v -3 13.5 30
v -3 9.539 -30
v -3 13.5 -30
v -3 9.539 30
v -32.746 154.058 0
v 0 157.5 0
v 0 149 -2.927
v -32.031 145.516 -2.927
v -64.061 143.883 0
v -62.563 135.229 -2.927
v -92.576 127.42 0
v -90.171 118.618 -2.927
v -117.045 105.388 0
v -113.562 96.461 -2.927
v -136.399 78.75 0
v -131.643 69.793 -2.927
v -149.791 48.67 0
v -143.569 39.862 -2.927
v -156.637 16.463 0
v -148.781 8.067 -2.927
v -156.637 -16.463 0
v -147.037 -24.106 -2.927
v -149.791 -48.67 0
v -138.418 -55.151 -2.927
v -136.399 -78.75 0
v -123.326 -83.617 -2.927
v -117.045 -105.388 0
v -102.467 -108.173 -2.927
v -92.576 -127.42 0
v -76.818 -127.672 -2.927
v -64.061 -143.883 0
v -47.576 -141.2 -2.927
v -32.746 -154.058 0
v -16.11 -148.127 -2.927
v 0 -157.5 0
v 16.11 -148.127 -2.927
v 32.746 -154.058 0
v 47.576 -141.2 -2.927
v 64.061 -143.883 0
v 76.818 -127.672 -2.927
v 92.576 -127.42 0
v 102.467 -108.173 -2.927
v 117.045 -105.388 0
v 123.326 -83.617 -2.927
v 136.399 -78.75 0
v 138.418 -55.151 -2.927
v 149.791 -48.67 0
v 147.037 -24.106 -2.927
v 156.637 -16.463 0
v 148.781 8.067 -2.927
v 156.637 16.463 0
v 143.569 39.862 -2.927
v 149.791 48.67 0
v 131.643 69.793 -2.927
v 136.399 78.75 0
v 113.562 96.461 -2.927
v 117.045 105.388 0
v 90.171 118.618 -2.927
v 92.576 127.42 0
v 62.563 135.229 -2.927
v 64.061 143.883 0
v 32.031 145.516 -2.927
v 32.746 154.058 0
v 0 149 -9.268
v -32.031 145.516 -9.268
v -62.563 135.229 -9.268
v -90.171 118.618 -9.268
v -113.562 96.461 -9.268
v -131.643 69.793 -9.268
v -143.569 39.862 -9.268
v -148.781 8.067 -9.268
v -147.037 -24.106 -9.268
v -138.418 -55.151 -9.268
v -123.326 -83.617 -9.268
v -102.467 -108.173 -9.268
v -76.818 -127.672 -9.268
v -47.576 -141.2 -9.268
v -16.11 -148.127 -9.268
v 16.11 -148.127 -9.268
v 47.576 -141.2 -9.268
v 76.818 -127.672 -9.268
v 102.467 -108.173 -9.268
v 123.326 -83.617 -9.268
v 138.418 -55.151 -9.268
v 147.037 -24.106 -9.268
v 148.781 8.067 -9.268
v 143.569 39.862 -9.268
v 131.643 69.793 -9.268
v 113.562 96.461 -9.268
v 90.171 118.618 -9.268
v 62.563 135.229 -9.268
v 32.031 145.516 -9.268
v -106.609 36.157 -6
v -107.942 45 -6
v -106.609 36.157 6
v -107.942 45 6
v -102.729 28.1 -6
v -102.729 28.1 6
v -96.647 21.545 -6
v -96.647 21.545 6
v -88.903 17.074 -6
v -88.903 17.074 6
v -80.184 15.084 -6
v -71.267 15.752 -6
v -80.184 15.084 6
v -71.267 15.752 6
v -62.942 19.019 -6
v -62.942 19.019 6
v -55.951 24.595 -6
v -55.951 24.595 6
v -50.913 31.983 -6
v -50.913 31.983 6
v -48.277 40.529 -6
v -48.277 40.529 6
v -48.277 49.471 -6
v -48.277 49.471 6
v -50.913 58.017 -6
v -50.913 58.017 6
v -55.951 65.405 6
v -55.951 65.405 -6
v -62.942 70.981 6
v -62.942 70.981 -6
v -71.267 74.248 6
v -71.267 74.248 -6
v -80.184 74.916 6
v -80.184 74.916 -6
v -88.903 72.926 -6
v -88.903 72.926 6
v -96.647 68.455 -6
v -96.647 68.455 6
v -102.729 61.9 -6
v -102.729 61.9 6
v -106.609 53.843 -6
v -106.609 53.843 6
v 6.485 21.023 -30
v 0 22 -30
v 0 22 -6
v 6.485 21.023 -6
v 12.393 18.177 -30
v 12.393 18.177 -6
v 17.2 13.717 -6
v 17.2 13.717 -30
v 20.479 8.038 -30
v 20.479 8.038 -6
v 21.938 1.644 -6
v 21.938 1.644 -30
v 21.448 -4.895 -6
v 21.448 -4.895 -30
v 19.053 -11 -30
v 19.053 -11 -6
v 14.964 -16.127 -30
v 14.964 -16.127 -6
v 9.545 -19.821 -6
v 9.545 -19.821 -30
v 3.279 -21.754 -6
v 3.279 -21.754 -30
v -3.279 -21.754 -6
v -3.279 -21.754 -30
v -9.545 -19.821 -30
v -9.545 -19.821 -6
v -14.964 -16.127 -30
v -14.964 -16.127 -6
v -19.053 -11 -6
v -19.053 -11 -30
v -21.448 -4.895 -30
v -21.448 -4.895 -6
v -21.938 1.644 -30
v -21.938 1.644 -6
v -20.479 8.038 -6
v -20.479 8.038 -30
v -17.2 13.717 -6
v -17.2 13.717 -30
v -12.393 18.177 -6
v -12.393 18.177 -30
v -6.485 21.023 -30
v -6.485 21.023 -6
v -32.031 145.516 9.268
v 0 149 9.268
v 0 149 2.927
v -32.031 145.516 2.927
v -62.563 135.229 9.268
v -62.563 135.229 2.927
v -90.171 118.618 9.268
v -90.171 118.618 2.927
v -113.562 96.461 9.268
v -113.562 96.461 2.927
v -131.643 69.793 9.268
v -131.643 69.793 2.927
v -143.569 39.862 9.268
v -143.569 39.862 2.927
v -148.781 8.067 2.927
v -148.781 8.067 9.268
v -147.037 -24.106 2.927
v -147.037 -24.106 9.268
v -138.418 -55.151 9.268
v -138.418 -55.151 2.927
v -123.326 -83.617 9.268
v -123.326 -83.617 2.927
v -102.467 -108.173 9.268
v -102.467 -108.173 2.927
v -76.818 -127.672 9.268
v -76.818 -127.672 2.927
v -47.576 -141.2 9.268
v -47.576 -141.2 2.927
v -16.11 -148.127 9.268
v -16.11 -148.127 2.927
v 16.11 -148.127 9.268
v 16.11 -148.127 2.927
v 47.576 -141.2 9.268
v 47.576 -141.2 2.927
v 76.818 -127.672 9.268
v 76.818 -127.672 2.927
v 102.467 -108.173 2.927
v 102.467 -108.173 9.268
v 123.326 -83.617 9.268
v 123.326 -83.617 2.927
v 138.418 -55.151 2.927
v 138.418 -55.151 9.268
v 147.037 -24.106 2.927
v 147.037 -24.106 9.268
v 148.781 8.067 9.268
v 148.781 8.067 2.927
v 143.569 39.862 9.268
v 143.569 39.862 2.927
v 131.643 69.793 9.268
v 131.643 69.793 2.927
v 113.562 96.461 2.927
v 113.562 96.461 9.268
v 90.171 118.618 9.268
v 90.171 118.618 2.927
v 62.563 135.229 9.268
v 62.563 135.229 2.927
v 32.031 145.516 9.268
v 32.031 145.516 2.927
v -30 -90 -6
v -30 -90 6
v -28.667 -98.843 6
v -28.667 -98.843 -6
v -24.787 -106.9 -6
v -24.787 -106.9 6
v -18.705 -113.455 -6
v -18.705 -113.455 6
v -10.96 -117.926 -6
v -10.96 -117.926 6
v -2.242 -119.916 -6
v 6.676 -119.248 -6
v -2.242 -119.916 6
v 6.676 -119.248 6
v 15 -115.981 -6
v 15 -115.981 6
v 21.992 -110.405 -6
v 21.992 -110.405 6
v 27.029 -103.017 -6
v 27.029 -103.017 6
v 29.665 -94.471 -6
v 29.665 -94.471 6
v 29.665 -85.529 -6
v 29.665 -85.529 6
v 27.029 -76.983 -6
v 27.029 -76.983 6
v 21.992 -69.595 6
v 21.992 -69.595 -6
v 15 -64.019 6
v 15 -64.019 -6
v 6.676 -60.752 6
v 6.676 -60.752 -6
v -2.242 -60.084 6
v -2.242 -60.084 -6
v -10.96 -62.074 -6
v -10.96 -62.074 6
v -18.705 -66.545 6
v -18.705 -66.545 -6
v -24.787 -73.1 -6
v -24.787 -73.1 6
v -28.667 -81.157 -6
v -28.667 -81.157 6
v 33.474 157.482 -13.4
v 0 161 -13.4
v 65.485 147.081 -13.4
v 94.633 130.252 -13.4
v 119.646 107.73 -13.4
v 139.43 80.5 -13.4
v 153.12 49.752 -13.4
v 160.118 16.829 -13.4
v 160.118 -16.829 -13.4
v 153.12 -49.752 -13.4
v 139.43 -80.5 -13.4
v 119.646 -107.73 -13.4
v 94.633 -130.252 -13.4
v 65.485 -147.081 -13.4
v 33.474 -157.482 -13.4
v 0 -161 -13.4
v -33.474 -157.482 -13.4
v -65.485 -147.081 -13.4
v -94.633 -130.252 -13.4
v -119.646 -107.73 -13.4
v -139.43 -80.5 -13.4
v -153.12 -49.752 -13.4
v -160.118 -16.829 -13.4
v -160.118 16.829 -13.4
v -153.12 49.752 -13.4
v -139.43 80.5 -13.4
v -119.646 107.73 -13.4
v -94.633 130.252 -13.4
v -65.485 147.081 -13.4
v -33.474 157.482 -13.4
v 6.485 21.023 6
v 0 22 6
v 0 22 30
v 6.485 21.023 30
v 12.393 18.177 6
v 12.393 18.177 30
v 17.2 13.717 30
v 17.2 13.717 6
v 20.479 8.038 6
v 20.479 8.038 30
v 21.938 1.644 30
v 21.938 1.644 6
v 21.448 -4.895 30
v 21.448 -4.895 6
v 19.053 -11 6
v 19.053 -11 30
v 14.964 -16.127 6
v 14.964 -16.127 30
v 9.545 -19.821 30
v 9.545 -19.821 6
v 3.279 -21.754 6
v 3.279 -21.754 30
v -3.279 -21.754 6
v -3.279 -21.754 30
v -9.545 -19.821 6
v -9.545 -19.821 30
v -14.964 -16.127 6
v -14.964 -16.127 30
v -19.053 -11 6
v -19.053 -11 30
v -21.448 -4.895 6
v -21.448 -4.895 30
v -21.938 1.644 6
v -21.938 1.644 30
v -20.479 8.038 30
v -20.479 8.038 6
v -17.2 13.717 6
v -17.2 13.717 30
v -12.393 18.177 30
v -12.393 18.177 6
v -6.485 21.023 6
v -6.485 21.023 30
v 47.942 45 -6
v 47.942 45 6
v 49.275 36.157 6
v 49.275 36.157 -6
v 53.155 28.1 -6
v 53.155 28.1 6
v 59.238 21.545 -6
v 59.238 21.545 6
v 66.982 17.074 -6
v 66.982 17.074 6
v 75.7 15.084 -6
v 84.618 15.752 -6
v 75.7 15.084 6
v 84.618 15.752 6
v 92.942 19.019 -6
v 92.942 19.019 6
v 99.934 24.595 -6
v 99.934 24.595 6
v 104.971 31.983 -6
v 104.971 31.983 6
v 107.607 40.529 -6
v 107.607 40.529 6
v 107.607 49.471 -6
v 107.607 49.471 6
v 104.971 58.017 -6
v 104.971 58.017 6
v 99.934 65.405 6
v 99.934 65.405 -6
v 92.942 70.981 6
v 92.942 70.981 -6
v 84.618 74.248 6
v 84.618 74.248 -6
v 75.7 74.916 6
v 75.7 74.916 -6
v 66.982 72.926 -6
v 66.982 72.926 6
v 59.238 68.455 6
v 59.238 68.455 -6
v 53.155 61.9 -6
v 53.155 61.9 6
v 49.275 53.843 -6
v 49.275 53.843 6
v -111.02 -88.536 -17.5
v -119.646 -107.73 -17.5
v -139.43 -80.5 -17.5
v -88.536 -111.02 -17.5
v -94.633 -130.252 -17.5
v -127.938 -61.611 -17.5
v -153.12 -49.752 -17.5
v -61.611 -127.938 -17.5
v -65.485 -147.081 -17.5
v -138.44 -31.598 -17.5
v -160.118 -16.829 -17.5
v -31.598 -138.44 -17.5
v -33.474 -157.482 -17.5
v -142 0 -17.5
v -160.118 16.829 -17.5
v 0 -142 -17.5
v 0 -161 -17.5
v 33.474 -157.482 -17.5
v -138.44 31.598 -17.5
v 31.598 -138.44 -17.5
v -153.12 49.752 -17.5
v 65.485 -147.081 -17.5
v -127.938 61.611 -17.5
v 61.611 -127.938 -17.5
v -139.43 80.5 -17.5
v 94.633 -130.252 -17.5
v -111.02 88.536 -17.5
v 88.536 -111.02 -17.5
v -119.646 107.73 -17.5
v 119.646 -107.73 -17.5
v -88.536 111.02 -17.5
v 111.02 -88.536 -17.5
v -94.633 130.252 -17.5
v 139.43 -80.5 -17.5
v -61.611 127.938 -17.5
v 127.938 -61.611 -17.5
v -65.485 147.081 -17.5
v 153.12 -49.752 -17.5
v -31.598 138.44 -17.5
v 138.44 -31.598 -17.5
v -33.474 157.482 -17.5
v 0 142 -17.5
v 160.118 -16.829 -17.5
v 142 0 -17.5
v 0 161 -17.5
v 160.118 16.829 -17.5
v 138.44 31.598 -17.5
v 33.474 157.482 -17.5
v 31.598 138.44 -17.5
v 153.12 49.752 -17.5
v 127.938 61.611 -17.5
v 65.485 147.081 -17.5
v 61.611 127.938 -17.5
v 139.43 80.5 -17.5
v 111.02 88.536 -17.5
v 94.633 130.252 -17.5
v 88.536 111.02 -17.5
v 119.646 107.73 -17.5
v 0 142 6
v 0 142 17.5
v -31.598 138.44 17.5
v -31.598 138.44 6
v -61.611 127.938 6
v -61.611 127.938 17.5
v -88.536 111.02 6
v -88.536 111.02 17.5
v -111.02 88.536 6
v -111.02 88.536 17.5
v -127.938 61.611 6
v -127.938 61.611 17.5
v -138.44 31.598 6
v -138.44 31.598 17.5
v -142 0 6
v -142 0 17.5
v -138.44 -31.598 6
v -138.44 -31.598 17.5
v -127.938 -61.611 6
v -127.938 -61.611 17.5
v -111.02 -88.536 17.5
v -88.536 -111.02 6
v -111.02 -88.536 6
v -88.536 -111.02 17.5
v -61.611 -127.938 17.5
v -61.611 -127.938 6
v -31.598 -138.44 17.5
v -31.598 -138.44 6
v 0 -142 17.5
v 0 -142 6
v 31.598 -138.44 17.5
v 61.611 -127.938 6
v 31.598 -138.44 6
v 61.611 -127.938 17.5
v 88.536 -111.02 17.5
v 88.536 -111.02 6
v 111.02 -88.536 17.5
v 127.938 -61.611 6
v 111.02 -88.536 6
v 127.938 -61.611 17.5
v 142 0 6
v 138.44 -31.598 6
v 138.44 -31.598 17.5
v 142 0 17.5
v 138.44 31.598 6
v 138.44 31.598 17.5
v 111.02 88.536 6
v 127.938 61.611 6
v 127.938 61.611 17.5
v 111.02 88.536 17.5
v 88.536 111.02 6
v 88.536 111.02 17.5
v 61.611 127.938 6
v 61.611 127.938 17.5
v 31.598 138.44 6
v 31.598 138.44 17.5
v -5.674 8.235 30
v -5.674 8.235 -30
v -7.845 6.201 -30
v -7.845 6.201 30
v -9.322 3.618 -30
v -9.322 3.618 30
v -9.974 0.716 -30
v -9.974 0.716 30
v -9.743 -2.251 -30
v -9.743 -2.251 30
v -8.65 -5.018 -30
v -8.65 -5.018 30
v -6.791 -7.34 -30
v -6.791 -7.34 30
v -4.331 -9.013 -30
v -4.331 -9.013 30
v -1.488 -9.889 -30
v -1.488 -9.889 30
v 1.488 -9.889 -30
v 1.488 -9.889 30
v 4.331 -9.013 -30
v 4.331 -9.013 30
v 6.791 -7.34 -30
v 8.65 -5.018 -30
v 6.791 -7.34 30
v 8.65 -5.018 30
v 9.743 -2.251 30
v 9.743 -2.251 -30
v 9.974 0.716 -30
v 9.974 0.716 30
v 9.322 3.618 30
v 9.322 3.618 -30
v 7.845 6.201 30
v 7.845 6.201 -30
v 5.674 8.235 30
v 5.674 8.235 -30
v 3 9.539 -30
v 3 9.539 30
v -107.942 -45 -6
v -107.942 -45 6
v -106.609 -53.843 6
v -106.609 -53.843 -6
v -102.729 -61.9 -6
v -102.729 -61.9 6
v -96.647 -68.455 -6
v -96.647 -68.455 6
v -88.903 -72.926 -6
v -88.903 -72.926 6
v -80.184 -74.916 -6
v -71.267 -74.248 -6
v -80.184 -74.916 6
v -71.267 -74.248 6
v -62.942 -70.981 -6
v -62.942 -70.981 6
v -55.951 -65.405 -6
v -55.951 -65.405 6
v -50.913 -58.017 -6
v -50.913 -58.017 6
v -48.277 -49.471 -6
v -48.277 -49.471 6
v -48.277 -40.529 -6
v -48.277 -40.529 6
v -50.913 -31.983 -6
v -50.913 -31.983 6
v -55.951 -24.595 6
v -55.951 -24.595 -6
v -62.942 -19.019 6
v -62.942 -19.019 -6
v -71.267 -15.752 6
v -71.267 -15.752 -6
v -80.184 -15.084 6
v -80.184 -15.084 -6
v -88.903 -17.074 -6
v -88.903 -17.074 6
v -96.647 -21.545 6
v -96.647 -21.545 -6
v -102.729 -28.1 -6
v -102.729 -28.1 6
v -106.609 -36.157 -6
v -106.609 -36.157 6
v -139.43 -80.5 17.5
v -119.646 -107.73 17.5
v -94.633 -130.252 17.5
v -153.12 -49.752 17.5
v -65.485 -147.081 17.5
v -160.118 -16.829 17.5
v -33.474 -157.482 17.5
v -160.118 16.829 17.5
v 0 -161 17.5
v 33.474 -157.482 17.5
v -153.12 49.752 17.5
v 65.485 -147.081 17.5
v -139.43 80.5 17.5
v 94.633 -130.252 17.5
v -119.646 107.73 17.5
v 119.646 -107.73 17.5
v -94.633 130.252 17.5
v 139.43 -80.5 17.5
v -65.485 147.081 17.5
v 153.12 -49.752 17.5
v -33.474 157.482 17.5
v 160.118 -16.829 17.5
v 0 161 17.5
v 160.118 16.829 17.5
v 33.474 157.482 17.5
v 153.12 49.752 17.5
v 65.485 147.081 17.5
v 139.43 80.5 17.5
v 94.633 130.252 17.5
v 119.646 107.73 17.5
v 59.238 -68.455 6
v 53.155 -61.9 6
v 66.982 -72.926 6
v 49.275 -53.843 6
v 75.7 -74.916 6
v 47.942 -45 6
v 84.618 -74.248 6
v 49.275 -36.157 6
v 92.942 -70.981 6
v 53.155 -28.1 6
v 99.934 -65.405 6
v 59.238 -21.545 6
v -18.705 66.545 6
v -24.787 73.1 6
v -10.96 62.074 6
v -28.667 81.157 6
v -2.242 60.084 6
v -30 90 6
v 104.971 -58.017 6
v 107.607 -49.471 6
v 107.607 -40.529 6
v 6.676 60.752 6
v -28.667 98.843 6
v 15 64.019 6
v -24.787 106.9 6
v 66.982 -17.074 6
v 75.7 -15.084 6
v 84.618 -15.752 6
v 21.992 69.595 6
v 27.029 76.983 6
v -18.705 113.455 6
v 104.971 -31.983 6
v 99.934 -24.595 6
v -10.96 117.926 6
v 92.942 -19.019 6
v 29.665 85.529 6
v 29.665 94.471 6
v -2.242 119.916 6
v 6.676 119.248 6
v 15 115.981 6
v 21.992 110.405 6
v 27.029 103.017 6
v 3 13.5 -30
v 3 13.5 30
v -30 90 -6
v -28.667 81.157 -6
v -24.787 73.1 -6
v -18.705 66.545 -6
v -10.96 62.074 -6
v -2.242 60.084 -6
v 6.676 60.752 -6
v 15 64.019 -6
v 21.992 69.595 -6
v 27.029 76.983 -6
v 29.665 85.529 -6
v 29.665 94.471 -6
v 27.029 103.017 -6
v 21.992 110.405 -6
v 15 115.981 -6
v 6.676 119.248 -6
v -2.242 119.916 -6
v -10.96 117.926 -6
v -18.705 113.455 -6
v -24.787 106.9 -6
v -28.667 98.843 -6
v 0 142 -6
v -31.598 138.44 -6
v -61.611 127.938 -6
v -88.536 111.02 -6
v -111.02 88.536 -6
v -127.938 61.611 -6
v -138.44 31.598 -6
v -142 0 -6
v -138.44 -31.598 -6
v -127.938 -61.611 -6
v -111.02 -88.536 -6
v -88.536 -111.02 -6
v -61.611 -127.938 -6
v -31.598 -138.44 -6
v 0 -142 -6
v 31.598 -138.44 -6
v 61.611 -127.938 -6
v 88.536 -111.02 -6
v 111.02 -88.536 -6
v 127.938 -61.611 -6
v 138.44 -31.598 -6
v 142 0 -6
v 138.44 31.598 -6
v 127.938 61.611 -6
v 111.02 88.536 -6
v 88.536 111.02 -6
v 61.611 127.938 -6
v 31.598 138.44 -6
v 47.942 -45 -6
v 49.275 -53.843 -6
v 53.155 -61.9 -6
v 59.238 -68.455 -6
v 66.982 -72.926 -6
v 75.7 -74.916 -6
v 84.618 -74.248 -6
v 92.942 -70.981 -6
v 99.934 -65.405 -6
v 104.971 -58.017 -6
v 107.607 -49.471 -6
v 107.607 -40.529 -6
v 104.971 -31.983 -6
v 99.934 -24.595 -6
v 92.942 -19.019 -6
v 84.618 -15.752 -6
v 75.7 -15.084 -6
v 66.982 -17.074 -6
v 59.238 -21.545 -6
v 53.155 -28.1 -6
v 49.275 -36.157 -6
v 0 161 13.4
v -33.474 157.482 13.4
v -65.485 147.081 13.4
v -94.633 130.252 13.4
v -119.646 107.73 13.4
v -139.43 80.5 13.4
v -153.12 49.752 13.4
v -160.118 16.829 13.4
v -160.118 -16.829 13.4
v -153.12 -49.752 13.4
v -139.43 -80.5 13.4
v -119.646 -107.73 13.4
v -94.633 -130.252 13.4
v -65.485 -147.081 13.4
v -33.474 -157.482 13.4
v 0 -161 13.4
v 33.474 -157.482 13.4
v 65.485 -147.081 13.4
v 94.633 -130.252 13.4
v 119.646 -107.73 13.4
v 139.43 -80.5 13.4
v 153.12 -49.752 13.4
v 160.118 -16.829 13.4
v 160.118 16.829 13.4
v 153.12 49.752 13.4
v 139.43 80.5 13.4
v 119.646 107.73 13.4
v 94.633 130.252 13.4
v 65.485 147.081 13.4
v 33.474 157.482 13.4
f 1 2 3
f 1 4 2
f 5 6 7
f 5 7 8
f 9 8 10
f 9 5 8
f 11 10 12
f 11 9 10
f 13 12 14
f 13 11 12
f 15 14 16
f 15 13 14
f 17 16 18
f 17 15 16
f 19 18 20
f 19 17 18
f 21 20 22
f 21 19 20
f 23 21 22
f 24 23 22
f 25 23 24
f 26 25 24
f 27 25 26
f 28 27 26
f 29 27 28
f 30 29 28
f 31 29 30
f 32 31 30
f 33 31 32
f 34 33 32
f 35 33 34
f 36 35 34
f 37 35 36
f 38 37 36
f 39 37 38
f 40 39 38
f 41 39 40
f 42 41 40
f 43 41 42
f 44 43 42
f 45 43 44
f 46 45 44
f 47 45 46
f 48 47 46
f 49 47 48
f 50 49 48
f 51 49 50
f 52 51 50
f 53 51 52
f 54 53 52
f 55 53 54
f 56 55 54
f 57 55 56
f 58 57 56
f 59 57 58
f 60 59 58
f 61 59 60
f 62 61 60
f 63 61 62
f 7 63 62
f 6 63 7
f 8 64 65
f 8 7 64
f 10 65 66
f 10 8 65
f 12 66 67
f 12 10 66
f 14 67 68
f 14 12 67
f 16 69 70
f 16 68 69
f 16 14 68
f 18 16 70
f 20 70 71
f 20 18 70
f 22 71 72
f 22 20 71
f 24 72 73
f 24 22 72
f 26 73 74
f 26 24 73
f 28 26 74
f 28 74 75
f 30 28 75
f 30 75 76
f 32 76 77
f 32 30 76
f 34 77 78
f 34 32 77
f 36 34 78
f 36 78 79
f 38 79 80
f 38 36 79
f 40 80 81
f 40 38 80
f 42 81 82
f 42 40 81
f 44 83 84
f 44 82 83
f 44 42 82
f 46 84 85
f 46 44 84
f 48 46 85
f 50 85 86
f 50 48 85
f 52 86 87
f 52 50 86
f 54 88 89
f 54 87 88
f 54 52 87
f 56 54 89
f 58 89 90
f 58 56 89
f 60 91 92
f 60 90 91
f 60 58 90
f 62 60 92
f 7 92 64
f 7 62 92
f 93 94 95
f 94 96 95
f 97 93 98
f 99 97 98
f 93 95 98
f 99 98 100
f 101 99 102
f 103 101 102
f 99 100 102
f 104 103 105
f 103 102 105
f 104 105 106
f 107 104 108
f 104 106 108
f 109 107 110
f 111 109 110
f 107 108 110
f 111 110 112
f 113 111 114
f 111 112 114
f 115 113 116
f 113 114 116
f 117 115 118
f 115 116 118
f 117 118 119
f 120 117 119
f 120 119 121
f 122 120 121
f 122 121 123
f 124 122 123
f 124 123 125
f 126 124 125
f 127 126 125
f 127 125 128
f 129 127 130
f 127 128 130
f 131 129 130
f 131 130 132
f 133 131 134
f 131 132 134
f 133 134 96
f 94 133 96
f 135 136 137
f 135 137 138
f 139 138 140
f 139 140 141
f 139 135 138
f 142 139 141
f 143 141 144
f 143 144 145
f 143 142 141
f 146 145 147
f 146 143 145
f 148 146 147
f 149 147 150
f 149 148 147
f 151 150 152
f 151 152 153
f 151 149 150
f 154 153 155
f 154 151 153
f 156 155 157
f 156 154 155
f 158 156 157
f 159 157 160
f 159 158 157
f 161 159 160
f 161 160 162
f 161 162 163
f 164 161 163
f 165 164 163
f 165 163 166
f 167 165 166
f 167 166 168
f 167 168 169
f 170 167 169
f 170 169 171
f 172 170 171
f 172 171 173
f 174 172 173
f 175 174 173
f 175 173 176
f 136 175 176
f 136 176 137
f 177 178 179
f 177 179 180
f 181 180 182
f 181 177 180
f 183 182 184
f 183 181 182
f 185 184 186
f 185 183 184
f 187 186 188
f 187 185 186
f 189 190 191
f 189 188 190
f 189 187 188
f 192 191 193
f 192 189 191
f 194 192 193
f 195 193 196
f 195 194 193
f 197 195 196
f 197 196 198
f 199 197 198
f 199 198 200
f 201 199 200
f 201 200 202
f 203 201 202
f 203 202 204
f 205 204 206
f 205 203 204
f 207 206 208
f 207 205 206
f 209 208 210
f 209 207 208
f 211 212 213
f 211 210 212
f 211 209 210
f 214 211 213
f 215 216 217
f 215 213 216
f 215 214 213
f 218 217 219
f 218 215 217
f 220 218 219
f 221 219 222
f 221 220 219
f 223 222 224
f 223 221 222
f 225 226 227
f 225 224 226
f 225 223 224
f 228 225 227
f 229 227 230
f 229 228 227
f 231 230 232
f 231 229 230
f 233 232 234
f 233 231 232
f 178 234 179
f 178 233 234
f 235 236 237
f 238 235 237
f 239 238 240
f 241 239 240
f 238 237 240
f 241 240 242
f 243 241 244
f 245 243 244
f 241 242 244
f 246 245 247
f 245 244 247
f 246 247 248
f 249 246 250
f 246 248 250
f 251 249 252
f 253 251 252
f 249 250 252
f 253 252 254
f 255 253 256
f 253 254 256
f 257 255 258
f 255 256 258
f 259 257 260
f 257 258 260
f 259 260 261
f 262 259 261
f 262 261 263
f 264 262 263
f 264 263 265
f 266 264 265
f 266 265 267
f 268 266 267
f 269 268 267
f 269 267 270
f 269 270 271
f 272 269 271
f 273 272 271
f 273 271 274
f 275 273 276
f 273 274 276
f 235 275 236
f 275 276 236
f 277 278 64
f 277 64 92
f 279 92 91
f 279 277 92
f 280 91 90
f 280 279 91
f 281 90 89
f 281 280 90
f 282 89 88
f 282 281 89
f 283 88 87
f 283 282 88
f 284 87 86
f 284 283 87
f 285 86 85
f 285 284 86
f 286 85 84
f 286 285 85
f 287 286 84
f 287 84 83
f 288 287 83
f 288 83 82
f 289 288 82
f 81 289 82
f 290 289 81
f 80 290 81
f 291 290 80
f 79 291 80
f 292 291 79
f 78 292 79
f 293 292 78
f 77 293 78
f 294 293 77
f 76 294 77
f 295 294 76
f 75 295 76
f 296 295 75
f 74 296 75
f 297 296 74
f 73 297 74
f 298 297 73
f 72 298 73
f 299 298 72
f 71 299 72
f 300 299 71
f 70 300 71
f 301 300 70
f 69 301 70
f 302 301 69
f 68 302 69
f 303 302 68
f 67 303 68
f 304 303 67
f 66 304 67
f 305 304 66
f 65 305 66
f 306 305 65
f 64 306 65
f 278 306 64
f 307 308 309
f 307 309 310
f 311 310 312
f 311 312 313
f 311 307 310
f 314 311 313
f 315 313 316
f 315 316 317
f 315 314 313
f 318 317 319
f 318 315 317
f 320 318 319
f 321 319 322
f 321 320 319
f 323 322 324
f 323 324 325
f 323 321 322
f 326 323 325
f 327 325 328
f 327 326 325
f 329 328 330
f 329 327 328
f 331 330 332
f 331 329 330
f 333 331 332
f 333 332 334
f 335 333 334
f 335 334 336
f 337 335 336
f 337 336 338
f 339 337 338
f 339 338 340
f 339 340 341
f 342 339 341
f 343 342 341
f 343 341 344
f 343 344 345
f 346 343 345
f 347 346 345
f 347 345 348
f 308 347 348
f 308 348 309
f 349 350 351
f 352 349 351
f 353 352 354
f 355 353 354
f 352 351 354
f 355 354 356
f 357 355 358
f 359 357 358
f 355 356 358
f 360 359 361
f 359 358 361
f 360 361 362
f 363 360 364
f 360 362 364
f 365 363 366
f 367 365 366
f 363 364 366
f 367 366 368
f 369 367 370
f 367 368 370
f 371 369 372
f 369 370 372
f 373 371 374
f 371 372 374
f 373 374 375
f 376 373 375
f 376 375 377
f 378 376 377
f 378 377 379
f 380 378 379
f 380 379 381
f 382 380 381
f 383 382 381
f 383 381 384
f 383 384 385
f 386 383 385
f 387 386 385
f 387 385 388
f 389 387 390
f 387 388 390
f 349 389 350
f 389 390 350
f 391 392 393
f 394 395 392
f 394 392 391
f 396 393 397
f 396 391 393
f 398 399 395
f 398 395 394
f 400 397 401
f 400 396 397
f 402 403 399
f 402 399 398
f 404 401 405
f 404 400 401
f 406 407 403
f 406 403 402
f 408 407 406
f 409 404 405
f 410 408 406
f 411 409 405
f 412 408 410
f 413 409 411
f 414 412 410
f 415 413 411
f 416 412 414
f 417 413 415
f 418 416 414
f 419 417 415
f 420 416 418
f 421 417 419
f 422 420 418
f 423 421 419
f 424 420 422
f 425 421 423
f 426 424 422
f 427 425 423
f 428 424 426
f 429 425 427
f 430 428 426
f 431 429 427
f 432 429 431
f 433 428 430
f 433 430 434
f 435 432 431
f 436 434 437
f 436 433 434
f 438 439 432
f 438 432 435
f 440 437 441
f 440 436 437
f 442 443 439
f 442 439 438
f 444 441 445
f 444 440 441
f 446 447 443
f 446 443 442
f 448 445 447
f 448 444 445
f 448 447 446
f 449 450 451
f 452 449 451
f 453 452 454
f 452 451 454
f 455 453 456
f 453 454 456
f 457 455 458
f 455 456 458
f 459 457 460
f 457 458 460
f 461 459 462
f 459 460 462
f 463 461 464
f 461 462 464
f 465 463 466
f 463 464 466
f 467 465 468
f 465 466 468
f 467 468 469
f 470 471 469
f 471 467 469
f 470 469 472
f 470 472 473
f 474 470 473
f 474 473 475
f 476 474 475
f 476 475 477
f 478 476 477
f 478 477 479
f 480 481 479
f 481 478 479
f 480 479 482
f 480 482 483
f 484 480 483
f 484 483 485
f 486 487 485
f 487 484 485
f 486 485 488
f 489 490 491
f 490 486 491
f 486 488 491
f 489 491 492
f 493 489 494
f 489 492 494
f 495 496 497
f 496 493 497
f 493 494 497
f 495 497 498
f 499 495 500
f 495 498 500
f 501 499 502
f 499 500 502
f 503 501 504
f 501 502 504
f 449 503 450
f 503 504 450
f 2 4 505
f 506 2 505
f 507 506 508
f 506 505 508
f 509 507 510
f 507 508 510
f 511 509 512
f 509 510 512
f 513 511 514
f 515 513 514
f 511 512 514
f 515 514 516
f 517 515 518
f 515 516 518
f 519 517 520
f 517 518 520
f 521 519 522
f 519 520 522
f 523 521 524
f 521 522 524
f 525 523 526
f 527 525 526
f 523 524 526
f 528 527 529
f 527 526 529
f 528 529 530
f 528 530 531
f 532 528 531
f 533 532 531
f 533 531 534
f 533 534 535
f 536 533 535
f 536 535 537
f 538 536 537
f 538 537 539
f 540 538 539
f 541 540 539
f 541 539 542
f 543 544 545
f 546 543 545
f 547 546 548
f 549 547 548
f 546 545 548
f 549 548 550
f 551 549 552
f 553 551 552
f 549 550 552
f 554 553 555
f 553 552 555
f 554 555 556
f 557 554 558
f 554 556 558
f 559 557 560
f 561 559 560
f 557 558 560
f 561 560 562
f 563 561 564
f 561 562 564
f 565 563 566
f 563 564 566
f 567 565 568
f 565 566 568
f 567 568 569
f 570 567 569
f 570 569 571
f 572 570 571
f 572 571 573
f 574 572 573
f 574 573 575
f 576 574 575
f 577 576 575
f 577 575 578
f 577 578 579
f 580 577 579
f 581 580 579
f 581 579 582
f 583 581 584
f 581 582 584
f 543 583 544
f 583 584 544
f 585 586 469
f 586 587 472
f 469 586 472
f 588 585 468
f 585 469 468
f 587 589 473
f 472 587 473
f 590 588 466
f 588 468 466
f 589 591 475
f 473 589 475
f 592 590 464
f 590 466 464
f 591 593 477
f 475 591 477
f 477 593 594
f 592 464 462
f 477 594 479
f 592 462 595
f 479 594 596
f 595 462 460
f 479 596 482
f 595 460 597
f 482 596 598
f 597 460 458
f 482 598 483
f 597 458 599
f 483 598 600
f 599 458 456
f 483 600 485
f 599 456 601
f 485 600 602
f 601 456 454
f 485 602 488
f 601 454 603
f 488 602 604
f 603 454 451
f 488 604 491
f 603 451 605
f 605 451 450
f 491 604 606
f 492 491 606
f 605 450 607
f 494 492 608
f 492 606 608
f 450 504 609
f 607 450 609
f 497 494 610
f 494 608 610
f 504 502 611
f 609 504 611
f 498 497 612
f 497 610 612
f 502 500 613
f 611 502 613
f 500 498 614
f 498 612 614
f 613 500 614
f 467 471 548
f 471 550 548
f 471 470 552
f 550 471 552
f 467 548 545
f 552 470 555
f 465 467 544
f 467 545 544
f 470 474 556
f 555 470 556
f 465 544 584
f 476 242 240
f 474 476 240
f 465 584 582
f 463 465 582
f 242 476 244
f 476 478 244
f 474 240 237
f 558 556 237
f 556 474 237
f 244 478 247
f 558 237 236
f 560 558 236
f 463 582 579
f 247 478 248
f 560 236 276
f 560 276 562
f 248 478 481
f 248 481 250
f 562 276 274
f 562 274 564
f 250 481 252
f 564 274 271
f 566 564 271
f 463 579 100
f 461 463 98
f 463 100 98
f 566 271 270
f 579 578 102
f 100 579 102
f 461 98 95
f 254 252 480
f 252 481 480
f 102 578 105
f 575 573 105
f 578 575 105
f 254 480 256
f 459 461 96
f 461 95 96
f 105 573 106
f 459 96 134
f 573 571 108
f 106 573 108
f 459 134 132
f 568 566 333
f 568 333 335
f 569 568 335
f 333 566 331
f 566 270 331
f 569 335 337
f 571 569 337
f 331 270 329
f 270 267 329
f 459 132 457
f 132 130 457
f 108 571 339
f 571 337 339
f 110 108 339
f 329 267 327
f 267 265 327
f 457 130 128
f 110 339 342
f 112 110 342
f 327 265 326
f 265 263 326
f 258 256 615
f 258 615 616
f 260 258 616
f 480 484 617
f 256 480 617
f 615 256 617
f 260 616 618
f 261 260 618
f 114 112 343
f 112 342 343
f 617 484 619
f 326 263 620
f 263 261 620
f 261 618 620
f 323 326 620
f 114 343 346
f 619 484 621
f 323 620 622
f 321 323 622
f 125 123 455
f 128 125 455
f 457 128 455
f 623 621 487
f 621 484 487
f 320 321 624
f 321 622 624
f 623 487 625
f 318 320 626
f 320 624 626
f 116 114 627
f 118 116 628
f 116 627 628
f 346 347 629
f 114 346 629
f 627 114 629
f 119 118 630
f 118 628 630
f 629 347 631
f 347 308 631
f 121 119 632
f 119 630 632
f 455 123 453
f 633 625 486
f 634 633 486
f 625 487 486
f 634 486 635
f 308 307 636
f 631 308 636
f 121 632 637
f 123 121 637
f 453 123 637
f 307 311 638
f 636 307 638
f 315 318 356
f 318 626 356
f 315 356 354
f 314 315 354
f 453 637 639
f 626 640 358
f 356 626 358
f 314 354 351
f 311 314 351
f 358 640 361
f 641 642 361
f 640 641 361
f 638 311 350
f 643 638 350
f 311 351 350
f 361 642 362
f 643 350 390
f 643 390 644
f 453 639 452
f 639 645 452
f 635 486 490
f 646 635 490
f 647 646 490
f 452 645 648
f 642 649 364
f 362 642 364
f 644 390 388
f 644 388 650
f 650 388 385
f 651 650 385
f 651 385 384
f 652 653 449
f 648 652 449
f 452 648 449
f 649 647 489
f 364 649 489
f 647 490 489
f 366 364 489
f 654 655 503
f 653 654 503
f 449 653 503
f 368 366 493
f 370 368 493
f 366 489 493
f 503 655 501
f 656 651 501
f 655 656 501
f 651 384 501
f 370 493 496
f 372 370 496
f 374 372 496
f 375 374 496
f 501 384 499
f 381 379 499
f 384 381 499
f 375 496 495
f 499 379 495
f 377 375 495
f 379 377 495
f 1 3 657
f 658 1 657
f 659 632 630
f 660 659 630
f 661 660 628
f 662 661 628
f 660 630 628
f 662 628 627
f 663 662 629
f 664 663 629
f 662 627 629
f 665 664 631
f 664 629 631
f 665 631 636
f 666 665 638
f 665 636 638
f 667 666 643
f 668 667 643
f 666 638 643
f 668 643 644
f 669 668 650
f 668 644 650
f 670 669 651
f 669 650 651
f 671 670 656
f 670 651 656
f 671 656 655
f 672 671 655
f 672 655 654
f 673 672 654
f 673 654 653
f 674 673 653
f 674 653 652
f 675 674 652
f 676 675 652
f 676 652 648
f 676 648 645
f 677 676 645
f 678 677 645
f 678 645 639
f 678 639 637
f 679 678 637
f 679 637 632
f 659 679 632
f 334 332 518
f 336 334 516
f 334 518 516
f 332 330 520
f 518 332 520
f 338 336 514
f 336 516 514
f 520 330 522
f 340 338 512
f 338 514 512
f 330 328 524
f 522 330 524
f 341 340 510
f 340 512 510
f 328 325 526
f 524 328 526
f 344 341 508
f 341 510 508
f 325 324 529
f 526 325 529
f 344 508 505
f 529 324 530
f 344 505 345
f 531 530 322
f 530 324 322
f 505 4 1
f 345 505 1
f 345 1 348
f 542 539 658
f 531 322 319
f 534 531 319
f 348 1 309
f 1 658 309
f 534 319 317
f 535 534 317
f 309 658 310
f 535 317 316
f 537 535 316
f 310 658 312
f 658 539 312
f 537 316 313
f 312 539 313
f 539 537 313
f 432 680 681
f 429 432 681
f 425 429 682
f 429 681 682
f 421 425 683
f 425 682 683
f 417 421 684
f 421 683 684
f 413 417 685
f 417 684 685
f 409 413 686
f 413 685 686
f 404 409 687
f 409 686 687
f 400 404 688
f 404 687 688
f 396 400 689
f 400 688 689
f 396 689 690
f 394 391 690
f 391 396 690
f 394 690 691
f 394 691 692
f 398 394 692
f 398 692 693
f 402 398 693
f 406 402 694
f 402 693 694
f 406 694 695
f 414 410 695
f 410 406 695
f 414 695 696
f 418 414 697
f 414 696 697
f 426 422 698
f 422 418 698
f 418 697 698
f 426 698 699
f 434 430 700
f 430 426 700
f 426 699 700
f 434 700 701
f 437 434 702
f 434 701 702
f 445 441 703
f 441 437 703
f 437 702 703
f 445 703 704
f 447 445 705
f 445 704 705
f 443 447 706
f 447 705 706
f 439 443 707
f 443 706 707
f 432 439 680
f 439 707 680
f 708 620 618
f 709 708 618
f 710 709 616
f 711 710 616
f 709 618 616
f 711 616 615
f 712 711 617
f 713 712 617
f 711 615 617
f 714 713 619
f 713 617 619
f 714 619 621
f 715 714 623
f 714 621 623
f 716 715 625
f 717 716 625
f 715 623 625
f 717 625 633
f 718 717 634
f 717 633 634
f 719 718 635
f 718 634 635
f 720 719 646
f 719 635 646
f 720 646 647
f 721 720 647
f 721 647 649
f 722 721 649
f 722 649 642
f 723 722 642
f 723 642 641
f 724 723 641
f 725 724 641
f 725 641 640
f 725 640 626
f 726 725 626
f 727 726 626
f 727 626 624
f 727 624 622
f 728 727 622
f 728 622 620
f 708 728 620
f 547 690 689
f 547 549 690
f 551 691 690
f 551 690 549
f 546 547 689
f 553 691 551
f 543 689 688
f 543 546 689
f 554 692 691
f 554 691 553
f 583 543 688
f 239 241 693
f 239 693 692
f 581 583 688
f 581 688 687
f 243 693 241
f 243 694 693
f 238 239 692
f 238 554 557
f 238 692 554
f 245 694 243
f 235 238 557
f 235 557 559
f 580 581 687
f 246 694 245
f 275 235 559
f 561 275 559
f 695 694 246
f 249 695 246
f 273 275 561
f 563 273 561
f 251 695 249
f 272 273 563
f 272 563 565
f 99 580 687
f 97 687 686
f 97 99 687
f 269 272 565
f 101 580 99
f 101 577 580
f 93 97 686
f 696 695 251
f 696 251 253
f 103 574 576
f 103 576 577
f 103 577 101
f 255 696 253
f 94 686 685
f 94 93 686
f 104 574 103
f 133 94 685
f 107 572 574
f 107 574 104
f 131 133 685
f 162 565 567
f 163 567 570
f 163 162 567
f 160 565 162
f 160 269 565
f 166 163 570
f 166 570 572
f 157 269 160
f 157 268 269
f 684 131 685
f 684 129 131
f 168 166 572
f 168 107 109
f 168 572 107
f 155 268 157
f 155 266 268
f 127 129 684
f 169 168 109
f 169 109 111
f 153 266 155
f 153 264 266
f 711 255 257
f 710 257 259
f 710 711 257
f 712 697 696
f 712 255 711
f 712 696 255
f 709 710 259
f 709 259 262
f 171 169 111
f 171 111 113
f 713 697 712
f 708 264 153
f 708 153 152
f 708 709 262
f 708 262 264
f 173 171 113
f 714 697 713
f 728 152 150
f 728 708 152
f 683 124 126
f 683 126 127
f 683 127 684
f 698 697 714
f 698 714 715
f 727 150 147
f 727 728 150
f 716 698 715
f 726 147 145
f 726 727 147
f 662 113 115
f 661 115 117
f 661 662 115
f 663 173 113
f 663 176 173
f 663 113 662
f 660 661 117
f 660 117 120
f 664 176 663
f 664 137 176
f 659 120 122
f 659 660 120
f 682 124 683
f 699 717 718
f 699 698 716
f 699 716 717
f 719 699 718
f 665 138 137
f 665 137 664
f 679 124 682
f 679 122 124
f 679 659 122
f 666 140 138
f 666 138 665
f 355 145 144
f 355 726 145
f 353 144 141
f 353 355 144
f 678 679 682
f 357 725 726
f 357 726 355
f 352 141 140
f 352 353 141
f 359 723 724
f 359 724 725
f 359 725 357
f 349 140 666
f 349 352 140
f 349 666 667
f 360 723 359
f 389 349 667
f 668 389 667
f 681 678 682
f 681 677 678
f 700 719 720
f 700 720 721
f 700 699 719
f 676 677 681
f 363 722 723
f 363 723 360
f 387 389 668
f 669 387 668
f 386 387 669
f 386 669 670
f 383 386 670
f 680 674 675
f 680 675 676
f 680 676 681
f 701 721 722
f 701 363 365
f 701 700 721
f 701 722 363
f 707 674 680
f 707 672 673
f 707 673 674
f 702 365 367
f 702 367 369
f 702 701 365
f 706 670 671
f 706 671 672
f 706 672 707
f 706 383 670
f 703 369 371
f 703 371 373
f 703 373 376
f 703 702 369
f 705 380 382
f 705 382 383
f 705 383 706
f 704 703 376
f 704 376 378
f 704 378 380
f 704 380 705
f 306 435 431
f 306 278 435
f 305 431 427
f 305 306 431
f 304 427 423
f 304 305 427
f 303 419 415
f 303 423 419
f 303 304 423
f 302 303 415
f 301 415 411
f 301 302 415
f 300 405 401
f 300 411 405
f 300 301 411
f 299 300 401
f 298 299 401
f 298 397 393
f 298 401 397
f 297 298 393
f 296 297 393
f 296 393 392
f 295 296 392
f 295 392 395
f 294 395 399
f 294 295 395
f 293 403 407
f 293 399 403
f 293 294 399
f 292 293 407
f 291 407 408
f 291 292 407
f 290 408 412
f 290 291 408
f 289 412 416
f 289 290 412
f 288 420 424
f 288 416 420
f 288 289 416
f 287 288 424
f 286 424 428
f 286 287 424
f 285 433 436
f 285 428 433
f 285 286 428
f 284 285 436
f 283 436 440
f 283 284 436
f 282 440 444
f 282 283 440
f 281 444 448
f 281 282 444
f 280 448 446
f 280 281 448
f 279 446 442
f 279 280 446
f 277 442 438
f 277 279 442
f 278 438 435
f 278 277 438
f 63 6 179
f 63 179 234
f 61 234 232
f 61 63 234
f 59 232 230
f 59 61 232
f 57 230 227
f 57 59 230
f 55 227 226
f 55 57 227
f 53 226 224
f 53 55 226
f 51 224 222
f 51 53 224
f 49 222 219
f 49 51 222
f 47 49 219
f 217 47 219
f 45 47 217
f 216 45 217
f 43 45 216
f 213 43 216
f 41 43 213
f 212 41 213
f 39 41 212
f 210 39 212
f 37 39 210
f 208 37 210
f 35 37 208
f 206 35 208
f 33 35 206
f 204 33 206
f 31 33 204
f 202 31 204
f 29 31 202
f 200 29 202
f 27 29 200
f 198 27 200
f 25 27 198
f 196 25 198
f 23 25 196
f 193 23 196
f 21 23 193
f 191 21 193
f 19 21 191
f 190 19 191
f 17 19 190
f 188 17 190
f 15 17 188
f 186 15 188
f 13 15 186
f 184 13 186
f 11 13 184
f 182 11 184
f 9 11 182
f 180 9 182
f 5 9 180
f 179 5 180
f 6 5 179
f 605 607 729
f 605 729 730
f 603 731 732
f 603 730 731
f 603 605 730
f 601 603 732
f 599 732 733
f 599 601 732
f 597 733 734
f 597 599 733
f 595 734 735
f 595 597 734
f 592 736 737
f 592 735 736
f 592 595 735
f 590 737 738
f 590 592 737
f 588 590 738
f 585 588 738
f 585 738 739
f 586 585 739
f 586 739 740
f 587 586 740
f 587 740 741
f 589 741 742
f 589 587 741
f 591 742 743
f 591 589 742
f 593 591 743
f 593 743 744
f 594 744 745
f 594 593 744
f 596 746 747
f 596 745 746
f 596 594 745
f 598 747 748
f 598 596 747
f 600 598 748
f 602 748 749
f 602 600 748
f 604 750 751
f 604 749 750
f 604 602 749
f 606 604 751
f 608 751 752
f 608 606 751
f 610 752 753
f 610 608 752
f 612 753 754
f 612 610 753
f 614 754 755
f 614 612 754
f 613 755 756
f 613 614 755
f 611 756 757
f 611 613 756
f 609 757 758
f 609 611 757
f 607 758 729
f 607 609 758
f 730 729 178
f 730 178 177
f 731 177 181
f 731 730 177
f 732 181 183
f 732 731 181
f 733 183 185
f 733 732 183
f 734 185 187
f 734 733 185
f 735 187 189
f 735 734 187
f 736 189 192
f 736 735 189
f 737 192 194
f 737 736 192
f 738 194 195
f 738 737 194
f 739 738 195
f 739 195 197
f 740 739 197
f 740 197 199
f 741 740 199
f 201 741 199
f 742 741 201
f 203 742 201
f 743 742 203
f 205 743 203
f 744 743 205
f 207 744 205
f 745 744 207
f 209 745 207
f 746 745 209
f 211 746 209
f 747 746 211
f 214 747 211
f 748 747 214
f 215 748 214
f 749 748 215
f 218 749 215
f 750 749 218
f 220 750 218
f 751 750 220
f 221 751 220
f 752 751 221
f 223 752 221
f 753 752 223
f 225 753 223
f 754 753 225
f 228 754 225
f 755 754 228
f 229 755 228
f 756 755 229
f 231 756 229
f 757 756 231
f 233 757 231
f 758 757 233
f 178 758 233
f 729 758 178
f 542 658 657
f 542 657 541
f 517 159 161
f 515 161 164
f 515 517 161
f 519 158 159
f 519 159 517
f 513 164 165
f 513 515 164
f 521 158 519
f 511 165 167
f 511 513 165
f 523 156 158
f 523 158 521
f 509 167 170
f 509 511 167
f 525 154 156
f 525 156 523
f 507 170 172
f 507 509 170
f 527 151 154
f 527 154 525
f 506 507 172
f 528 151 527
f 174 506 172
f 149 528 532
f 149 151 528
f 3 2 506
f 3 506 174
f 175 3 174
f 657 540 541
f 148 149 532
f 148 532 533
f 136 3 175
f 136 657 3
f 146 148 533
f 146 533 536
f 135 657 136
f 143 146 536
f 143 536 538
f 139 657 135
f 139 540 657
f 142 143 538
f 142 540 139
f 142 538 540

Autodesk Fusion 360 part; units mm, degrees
sketch "草图1" plane through (0, 0, 0) normal (1, 0, 0) x (0, 1, 0)
  line L0 (0, 90) -> (0, -60) construction
  line L1 (0, 30) -> (22, 30)
  line L2 (22, 30) -> (22, -30)
  line L3 (22, -30) -> (0, -30)
  line L4 (22, 6) -> (142, 6)
  line L5 (142, 6) -> (142, 17.5)
  line L6 (142, 17.5) -> (161, 17.5)
  line L7 (161, -17.5) -> (142, -17.5)
  line L8 (142, -17.5) -> (142, -6)
  line L9 (142, -6) -> (22, -6)
  line L10 (0, 30) -> (0, -30)
  line L11 (-55, 0) -> (190, 0) construction
  line L12 (161, -17.5) -> (161, -13.4)
  line L13 (161, -13.4) -> (149, -9.2681)
  line L14 (149, -9.2681) -> (149, -2.9268)
  line L15 (149, -2.9268) -> (157.5, 0)
  line L16 (157.5, 0) -> (149, 2.9268)
  line L17 (149, 2.9268) -> (149, 9.2681)
  line L18 (149, 9.2681) -> (161, 13.4)
  line L19 (161, 13.4) -> (161, 17.5)
  line L20 (149, -6.0974) -> (142, -6.0974) construction
  line L21 (149, 6.0974) -> (148, 6.0974)
  line L22 (148, 6.0974) -> (142, 6.0974) construction
  point P0 (149, 6.0974)
  point P1 (149, -6.0974)
  dimension "d1" = 22
  dimension "d2" = 60
  dimension "d3" = 12
  dimension "d5" = 161
  dimension "d6" = 157.5
  dimension "d7" = 149
  dimension "d8" = 13.4
  dimension "d9" = 38
  dimension "d10" = 142
  dimension "d11" = 35
revolve "旋转1" add sketch "草图1" angle 360 about axis through (0, 0, 90) along (0, 0, -1)
sketch "草图2" plane through (0, 0, 6) normal (0, 0, 1) x (-1, 0, 0)
  circle A0 centre (0, 0) radius 22
  circle A1 centre (0, 0) radius 142
  circle A2 centre (0, -90) radius 30
  circle A3 centre (77.9423, -45) radius 30
  circle A4 centre (77.9423, 45) radius 30
  circle A5 centre (0, 90) radius 30
  circle A6 centre (-77.9423, 45) radius 30
  circle A7 centre (-77.9423, -45) radius 30
  dimension "d13" = 90
  dimension "d14" = 60
  dimension "d16" = 360
extrude "拉伸1" cut sketch "草图2" against normal blind 90 contours A2 | A3 | A4 | A5 | A6 | A7
sketch "草图3" plane through (0, 0, 30) normal (0, 0, 1) x (-1, 0, 0)
  circle A0 centre (0, 0) radius 22
  line L0 (3, -9.5394) -> (3, -13.5)
  line L1 (3, -13.5) -> (-3, -13.5)
  line L2 (-3, -13.5) -> (-3, -9.5394)
  line L3 (0, -30) -> (0, 30) construction
  arc A1 (3, -9.5394) -> (-3, -9.5394) centre (0, 0) ccw
  dimension "d19" = 6
  dimension "d20" = 20
  dimension "d21" = 23.5
extrude "拉伸2" cut sketch "草图3" against normal blind 110 contours L0 L1 L2 A1
